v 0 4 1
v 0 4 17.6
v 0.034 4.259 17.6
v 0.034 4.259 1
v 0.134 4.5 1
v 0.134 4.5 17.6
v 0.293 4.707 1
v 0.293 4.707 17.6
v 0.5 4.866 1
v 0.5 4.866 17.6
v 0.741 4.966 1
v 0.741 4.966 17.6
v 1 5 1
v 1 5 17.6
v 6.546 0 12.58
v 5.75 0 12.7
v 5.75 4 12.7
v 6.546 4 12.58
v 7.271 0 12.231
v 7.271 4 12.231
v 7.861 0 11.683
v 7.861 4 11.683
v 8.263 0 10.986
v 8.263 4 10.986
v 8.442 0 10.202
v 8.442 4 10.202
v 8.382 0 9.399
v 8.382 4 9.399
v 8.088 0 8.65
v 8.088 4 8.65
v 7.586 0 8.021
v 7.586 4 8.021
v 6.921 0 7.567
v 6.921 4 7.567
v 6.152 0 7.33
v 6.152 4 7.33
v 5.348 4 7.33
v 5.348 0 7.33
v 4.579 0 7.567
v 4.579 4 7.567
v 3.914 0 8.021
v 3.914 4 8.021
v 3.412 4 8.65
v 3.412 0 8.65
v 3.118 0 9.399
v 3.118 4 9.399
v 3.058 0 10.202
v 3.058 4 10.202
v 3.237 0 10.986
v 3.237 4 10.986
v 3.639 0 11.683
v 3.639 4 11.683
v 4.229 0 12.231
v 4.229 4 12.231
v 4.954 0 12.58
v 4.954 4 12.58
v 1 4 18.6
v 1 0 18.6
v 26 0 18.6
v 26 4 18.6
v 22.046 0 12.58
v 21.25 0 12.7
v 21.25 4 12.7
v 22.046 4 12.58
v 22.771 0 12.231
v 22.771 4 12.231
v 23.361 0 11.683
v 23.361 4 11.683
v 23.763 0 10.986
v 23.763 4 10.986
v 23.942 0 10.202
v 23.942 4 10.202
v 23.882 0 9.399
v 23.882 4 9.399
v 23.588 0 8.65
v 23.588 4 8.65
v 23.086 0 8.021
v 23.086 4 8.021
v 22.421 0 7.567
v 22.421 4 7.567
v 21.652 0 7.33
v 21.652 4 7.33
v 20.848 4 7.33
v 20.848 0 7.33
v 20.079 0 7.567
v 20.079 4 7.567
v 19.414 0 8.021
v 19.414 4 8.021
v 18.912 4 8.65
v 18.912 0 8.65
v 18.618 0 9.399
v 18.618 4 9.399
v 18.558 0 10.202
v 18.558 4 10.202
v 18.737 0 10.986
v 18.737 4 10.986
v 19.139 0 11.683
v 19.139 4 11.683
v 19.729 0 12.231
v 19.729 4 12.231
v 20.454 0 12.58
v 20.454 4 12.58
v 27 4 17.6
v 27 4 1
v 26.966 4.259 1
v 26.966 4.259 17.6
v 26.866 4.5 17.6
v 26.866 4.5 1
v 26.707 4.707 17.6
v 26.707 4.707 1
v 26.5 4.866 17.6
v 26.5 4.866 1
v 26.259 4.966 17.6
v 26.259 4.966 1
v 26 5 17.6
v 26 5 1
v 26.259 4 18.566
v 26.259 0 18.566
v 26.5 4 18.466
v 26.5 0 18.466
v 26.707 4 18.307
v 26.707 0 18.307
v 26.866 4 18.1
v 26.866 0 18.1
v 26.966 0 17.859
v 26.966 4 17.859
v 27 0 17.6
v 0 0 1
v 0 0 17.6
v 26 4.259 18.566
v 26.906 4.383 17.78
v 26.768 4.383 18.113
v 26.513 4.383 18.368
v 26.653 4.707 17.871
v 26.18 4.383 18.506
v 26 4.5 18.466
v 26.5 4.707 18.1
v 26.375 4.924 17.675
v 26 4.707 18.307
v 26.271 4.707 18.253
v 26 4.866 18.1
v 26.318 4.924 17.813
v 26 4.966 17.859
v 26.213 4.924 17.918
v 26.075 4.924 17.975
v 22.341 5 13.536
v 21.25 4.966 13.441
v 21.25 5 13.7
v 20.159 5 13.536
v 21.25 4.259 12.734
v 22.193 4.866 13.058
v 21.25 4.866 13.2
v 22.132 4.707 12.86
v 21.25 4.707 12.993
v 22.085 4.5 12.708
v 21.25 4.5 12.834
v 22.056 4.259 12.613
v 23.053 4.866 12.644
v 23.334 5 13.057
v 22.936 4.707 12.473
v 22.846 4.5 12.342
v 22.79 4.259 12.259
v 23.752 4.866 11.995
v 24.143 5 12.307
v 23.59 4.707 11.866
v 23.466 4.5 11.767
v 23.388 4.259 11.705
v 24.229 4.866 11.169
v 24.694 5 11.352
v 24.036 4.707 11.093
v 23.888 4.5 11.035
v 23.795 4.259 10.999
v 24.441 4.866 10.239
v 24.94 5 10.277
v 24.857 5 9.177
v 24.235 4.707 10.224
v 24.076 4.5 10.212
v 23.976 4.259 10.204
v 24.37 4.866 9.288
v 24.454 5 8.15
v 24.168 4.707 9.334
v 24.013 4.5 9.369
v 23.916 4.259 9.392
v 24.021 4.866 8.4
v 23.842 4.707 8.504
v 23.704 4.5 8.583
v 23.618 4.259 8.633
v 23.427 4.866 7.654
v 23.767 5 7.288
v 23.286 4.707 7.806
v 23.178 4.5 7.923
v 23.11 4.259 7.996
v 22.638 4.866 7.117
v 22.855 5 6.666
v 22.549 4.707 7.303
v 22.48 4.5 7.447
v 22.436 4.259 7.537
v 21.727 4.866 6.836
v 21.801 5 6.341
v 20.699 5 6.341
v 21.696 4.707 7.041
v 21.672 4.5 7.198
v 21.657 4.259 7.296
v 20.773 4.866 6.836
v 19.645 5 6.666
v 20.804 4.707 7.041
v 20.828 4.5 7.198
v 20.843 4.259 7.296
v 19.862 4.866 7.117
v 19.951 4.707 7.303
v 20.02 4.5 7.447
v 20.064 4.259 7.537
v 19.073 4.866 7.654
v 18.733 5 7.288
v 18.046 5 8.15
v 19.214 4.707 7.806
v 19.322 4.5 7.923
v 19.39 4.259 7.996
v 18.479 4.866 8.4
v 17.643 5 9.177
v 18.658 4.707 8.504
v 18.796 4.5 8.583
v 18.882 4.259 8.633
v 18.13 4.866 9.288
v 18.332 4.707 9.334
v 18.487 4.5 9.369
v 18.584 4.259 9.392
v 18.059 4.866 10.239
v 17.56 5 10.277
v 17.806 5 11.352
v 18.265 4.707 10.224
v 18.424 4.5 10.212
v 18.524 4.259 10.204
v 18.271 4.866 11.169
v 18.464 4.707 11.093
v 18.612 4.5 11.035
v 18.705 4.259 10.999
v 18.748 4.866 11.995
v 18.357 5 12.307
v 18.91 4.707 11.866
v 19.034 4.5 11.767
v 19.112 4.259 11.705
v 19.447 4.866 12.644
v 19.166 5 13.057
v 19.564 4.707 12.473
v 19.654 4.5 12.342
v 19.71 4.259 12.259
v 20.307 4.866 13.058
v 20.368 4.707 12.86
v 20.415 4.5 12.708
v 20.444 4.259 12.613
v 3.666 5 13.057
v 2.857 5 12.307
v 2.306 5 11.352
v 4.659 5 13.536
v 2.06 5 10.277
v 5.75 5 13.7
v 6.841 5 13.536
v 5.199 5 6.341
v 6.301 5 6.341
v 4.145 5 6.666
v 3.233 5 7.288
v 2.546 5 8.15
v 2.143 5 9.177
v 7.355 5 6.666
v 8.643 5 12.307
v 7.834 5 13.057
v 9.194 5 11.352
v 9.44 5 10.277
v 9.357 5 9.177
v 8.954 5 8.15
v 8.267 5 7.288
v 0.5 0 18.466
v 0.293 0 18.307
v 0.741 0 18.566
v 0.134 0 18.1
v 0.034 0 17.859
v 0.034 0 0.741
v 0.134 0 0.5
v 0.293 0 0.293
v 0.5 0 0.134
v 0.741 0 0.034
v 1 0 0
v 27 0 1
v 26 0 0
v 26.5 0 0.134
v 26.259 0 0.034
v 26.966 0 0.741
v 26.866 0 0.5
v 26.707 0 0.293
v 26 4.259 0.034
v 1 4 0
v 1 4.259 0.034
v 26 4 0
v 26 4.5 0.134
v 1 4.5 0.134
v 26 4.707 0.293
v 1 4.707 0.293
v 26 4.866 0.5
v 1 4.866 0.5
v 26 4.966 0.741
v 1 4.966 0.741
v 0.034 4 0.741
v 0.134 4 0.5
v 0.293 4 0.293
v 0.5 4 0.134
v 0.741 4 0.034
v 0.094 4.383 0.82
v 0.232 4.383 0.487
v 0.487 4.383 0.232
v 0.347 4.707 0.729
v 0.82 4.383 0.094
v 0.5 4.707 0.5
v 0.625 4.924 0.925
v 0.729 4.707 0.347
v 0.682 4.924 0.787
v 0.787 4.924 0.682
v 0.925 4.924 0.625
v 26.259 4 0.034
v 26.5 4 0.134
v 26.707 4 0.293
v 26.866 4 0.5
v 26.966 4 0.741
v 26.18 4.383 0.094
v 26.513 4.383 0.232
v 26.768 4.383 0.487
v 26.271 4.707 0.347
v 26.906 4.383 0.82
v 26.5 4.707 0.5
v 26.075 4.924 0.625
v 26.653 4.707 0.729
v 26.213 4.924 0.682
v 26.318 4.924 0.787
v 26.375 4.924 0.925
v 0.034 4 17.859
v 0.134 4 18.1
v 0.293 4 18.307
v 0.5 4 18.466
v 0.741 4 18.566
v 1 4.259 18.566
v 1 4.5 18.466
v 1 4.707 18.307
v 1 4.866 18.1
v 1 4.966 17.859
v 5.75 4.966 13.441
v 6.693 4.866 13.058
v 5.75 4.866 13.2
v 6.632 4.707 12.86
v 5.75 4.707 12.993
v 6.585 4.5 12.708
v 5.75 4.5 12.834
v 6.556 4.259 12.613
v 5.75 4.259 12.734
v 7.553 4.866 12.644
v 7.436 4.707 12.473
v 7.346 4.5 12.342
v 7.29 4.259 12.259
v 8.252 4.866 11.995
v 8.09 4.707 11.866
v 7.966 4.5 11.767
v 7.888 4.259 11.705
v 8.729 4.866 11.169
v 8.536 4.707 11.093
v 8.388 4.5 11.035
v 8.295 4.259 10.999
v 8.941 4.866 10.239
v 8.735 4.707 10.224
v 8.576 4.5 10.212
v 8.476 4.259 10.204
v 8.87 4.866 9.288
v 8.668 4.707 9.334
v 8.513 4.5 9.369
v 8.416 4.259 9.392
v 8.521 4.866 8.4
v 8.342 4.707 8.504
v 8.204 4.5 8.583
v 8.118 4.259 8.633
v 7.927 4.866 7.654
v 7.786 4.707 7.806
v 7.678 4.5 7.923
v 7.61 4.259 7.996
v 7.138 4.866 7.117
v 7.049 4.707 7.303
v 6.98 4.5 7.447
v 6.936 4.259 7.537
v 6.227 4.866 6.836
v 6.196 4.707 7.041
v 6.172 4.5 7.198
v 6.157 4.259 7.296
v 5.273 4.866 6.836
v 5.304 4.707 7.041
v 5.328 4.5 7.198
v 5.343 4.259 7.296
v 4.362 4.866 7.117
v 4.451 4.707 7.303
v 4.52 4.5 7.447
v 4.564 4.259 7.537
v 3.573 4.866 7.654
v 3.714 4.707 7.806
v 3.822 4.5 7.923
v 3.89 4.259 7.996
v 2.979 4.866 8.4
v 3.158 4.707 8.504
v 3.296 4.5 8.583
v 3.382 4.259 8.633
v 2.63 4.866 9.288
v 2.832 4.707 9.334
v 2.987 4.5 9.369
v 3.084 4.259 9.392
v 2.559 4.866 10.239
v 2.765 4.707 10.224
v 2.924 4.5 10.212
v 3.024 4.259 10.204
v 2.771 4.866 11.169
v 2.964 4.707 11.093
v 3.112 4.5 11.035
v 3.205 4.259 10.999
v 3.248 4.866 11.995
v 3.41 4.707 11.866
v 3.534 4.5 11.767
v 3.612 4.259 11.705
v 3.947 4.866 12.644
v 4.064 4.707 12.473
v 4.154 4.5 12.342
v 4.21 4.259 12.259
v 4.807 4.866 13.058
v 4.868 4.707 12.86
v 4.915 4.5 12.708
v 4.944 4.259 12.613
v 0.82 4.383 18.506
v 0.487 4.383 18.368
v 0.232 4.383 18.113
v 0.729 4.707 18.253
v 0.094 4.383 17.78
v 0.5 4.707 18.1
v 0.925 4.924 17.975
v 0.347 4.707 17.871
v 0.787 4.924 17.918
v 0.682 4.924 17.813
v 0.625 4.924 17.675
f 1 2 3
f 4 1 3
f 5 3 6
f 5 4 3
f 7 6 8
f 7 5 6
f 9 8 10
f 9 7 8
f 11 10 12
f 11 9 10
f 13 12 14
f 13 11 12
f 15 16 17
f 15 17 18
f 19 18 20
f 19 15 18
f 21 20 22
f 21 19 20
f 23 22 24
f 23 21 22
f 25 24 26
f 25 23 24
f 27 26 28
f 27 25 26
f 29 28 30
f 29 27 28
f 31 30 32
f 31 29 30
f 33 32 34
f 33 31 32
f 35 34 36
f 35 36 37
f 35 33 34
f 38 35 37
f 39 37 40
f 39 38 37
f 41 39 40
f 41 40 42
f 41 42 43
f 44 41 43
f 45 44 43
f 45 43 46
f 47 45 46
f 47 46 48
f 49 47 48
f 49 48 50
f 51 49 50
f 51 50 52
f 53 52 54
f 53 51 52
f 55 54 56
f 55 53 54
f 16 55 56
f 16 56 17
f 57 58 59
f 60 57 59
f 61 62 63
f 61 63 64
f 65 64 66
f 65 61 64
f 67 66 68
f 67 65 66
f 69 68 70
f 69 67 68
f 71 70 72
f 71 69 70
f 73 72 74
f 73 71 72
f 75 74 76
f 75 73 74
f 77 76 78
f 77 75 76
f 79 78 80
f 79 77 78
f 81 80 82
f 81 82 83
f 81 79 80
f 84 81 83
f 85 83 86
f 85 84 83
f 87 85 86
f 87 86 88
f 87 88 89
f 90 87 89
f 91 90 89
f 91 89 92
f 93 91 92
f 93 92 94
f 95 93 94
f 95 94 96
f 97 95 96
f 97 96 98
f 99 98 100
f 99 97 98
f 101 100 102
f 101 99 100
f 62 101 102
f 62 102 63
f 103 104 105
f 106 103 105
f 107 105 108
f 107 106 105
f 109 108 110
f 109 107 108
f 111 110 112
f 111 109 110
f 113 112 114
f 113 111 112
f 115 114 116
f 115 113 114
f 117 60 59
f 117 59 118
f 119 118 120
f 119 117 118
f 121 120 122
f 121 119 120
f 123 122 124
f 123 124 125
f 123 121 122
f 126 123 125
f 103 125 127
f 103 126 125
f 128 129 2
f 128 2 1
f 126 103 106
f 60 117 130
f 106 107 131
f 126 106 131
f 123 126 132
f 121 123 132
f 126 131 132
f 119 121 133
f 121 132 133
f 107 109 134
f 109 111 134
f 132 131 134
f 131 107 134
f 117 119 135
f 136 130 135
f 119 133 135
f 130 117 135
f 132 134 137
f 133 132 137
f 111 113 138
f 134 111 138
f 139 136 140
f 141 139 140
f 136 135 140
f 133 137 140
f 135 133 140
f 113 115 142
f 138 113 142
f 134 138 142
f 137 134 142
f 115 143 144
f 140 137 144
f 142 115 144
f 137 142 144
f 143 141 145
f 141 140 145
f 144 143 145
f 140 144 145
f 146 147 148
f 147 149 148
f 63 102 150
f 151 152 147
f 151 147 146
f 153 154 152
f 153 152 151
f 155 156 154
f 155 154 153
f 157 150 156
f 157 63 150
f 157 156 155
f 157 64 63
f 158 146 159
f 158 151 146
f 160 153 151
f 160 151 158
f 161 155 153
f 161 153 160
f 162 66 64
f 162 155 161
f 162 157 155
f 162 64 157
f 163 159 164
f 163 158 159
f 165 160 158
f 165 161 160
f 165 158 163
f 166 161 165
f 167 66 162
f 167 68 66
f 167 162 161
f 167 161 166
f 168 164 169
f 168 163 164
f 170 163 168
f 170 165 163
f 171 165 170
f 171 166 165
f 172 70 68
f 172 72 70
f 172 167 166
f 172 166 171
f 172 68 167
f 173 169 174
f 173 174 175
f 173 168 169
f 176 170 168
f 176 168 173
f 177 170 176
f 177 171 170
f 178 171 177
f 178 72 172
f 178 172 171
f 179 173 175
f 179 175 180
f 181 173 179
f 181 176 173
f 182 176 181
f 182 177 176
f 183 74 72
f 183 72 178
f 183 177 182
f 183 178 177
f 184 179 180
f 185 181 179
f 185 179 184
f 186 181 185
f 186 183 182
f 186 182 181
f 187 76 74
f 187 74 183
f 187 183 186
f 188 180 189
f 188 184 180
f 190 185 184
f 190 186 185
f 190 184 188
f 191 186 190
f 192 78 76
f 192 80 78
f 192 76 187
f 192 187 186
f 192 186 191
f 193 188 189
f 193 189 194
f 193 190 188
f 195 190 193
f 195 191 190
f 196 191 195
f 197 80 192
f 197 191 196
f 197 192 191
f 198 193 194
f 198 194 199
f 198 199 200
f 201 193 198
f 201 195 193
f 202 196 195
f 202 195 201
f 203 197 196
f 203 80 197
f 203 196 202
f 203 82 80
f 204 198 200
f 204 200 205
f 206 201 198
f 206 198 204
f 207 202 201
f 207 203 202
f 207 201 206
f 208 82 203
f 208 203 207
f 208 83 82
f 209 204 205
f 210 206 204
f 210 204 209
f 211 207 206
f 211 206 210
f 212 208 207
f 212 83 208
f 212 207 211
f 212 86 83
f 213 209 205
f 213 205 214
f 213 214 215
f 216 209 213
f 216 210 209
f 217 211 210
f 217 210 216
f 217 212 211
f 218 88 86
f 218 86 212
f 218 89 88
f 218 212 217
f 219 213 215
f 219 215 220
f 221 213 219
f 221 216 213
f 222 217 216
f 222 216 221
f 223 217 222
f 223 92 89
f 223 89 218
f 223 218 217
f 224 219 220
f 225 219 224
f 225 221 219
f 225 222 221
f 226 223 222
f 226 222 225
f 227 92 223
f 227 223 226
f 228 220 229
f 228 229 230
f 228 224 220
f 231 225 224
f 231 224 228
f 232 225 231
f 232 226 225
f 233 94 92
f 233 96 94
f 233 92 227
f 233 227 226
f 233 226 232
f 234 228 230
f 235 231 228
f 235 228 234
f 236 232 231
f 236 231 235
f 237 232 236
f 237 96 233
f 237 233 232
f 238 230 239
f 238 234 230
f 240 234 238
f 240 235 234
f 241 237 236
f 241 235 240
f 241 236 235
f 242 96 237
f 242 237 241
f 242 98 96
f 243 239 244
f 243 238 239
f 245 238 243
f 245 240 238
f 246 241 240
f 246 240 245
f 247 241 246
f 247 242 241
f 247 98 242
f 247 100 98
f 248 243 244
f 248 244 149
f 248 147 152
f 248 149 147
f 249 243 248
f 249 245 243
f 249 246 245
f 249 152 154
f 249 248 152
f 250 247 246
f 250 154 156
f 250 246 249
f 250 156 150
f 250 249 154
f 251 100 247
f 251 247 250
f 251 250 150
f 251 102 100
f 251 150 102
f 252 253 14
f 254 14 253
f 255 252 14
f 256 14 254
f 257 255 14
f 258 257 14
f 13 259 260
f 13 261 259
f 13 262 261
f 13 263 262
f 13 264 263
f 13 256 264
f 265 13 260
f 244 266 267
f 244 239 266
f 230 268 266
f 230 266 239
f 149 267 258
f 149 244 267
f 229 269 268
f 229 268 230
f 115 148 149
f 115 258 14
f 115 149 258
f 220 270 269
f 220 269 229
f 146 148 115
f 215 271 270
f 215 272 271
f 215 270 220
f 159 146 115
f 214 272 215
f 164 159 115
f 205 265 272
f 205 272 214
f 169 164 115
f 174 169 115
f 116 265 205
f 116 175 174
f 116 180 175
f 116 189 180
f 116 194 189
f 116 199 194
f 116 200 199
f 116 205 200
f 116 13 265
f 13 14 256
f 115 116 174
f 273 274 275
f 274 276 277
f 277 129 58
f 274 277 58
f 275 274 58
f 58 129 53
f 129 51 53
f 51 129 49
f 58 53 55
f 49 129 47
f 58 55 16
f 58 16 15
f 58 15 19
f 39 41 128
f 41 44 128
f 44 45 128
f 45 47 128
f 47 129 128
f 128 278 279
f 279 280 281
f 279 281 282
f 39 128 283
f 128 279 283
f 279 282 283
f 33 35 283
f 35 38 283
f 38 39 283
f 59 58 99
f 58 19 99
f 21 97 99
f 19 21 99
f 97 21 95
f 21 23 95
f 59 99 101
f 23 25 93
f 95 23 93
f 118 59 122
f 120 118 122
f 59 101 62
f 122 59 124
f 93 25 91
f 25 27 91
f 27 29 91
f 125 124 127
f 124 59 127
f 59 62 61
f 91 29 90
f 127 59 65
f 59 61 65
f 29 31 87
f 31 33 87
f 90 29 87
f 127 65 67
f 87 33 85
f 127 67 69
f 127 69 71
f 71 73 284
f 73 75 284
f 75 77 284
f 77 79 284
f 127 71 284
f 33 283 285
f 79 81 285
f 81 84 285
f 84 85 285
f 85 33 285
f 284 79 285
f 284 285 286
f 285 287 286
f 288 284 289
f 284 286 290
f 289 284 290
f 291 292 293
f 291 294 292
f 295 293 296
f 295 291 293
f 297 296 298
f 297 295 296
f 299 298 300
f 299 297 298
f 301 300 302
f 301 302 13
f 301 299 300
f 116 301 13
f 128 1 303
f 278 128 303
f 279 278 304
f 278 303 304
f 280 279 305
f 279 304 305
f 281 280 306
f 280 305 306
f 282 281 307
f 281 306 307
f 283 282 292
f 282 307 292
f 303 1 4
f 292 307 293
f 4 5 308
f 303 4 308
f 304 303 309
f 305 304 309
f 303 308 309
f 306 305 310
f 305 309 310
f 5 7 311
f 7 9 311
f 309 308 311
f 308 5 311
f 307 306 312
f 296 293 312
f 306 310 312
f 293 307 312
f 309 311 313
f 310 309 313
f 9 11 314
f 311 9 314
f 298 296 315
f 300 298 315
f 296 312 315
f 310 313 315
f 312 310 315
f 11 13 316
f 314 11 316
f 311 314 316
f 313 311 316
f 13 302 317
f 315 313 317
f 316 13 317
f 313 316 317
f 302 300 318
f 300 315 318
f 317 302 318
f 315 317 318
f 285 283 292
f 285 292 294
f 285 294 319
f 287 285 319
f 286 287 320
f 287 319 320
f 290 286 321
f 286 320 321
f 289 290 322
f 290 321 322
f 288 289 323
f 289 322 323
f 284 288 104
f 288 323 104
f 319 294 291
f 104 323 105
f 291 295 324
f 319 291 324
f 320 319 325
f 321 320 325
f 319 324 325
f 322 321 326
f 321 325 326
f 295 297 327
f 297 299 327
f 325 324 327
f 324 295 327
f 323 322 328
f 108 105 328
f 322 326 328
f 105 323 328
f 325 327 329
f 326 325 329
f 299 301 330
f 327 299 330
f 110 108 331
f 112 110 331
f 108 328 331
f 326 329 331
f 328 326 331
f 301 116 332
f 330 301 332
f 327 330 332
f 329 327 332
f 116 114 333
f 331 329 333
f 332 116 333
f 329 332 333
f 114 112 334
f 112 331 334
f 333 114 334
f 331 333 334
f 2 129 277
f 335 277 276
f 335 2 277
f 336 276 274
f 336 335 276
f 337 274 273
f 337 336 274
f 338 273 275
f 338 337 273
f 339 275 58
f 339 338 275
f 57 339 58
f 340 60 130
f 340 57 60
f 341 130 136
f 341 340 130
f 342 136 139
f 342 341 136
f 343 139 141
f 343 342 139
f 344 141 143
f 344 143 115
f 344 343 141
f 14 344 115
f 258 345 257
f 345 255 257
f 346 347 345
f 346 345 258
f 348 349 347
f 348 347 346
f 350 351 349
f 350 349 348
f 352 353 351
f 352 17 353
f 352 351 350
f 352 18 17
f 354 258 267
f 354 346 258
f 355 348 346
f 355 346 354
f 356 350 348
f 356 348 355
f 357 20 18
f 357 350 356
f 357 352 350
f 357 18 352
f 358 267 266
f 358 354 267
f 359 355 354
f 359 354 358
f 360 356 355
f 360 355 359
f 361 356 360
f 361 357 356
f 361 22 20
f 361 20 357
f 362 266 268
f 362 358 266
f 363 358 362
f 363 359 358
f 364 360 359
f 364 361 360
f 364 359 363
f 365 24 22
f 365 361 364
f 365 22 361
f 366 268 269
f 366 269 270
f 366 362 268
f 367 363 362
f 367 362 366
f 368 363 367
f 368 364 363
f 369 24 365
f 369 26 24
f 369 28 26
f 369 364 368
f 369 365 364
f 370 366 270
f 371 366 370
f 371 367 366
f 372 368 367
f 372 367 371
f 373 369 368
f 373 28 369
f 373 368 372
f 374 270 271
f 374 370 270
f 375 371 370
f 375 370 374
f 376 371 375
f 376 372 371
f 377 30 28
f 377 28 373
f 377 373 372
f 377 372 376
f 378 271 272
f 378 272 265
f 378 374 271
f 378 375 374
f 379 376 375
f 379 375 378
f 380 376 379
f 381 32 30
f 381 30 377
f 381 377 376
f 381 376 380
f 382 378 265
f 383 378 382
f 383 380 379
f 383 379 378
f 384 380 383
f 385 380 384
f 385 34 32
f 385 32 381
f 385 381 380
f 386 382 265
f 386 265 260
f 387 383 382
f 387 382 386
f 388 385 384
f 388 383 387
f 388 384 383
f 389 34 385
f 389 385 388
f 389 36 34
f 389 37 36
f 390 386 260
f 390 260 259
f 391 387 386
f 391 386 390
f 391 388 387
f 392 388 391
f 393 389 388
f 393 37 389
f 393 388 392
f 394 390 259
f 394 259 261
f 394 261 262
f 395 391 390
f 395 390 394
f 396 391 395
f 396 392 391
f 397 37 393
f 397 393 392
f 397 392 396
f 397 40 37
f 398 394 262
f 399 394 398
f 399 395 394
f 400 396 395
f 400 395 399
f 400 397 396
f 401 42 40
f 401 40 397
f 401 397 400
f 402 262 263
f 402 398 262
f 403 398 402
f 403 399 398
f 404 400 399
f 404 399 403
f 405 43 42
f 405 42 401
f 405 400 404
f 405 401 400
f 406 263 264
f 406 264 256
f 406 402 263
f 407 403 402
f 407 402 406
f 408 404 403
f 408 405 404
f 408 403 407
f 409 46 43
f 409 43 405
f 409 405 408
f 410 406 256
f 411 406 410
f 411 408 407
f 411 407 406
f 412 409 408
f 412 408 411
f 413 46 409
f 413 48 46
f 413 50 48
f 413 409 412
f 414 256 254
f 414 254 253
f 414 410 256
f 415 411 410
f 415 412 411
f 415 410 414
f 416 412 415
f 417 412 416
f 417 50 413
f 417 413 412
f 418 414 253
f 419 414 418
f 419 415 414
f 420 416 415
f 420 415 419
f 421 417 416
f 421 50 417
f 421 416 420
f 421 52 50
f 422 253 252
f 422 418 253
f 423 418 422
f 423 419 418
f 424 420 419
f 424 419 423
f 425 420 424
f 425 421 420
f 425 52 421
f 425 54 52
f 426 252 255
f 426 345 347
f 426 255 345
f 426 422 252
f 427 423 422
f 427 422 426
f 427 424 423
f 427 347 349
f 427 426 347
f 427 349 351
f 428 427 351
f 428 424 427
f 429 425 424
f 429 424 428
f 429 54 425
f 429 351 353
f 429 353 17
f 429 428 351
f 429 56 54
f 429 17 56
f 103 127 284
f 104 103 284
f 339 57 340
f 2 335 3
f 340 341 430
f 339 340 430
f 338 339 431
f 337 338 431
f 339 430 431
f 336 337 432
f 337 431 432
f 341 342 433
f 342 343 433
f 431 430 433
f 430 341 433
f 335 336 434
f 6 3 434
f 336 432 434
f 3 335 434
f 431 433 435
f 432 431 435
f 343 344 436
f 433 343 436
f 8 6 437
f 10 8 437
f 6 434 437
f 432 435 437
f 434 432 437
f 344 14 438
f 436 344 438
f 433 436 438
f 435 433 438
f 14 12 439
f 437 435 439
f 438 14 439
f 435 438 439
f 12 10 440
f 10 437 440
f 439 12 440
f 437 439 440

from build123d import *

# Parameters (mm, degrees)
SKETCH_1_W      = 27
SKETCH_1_H      = 18.6
SKETCH_1_R      = 2.7
EXTRUDE_1_DEPTH = 5
FILLET_2_R      = 1
FILLET_3_R      = 1


with BuildPart() as part:
    # 草图1 → 凸台-拉伸1 (new body)
    with BuildSketch(Plane(origin=(0, 0, 0), x_dir=(1, 0, 0), z_dir=(0, 1, 0))):
        with Locations((13.5, -9.3)):
            Rectangle(SKETCH_1_W, SKETCH_1_H)
        with Locations(Location((5.75, -10, 0), (0, 0, 270))):
            Circle(SKETCH_1_R, mode=Mode.SUBTRACT)
        with Locations(Location((21.25, -10, 0), (0, 0, 270))):
            Circle(SKETCH_1_R, mode=Mode.SUBTRACT)
    extrude(amount=EXTRUDE_1_DEPTH)

    # 圆角2
    fillet_2_edges = [part.edges().sort_by_distance(p)[0] for p in [
        (0, 2.5, 0),
        (27, 2.5, 0),
        (27, 2.5, 18.6),
        (0, 2.5, 18.6),
    ]]
    fillet(fillet_2_edges, radius=FILLET_2_R)

    # 圆角3
    fillet_3_edges = [part.edges().sort_by_distance(p)[0] for p in [
        (5.75, 5, 7.3),
        (21.25, 5, 7.3),
        (0, 5, 9.3),
        (13.5, 5, 0),
        (13.5, 5, 18.6),
        (27, 5, 9.3),
        (26.707106781, 5, 18.307106781),
        (0.292893219, 5, 18.307106781),
        (26.707106781, 5, 0.292893219),
        (0.292893219, 5, 0.292893219),
    ]]
    fillet(fillet_3_edges, radius=FILLET_3_R)


solid = part.part
